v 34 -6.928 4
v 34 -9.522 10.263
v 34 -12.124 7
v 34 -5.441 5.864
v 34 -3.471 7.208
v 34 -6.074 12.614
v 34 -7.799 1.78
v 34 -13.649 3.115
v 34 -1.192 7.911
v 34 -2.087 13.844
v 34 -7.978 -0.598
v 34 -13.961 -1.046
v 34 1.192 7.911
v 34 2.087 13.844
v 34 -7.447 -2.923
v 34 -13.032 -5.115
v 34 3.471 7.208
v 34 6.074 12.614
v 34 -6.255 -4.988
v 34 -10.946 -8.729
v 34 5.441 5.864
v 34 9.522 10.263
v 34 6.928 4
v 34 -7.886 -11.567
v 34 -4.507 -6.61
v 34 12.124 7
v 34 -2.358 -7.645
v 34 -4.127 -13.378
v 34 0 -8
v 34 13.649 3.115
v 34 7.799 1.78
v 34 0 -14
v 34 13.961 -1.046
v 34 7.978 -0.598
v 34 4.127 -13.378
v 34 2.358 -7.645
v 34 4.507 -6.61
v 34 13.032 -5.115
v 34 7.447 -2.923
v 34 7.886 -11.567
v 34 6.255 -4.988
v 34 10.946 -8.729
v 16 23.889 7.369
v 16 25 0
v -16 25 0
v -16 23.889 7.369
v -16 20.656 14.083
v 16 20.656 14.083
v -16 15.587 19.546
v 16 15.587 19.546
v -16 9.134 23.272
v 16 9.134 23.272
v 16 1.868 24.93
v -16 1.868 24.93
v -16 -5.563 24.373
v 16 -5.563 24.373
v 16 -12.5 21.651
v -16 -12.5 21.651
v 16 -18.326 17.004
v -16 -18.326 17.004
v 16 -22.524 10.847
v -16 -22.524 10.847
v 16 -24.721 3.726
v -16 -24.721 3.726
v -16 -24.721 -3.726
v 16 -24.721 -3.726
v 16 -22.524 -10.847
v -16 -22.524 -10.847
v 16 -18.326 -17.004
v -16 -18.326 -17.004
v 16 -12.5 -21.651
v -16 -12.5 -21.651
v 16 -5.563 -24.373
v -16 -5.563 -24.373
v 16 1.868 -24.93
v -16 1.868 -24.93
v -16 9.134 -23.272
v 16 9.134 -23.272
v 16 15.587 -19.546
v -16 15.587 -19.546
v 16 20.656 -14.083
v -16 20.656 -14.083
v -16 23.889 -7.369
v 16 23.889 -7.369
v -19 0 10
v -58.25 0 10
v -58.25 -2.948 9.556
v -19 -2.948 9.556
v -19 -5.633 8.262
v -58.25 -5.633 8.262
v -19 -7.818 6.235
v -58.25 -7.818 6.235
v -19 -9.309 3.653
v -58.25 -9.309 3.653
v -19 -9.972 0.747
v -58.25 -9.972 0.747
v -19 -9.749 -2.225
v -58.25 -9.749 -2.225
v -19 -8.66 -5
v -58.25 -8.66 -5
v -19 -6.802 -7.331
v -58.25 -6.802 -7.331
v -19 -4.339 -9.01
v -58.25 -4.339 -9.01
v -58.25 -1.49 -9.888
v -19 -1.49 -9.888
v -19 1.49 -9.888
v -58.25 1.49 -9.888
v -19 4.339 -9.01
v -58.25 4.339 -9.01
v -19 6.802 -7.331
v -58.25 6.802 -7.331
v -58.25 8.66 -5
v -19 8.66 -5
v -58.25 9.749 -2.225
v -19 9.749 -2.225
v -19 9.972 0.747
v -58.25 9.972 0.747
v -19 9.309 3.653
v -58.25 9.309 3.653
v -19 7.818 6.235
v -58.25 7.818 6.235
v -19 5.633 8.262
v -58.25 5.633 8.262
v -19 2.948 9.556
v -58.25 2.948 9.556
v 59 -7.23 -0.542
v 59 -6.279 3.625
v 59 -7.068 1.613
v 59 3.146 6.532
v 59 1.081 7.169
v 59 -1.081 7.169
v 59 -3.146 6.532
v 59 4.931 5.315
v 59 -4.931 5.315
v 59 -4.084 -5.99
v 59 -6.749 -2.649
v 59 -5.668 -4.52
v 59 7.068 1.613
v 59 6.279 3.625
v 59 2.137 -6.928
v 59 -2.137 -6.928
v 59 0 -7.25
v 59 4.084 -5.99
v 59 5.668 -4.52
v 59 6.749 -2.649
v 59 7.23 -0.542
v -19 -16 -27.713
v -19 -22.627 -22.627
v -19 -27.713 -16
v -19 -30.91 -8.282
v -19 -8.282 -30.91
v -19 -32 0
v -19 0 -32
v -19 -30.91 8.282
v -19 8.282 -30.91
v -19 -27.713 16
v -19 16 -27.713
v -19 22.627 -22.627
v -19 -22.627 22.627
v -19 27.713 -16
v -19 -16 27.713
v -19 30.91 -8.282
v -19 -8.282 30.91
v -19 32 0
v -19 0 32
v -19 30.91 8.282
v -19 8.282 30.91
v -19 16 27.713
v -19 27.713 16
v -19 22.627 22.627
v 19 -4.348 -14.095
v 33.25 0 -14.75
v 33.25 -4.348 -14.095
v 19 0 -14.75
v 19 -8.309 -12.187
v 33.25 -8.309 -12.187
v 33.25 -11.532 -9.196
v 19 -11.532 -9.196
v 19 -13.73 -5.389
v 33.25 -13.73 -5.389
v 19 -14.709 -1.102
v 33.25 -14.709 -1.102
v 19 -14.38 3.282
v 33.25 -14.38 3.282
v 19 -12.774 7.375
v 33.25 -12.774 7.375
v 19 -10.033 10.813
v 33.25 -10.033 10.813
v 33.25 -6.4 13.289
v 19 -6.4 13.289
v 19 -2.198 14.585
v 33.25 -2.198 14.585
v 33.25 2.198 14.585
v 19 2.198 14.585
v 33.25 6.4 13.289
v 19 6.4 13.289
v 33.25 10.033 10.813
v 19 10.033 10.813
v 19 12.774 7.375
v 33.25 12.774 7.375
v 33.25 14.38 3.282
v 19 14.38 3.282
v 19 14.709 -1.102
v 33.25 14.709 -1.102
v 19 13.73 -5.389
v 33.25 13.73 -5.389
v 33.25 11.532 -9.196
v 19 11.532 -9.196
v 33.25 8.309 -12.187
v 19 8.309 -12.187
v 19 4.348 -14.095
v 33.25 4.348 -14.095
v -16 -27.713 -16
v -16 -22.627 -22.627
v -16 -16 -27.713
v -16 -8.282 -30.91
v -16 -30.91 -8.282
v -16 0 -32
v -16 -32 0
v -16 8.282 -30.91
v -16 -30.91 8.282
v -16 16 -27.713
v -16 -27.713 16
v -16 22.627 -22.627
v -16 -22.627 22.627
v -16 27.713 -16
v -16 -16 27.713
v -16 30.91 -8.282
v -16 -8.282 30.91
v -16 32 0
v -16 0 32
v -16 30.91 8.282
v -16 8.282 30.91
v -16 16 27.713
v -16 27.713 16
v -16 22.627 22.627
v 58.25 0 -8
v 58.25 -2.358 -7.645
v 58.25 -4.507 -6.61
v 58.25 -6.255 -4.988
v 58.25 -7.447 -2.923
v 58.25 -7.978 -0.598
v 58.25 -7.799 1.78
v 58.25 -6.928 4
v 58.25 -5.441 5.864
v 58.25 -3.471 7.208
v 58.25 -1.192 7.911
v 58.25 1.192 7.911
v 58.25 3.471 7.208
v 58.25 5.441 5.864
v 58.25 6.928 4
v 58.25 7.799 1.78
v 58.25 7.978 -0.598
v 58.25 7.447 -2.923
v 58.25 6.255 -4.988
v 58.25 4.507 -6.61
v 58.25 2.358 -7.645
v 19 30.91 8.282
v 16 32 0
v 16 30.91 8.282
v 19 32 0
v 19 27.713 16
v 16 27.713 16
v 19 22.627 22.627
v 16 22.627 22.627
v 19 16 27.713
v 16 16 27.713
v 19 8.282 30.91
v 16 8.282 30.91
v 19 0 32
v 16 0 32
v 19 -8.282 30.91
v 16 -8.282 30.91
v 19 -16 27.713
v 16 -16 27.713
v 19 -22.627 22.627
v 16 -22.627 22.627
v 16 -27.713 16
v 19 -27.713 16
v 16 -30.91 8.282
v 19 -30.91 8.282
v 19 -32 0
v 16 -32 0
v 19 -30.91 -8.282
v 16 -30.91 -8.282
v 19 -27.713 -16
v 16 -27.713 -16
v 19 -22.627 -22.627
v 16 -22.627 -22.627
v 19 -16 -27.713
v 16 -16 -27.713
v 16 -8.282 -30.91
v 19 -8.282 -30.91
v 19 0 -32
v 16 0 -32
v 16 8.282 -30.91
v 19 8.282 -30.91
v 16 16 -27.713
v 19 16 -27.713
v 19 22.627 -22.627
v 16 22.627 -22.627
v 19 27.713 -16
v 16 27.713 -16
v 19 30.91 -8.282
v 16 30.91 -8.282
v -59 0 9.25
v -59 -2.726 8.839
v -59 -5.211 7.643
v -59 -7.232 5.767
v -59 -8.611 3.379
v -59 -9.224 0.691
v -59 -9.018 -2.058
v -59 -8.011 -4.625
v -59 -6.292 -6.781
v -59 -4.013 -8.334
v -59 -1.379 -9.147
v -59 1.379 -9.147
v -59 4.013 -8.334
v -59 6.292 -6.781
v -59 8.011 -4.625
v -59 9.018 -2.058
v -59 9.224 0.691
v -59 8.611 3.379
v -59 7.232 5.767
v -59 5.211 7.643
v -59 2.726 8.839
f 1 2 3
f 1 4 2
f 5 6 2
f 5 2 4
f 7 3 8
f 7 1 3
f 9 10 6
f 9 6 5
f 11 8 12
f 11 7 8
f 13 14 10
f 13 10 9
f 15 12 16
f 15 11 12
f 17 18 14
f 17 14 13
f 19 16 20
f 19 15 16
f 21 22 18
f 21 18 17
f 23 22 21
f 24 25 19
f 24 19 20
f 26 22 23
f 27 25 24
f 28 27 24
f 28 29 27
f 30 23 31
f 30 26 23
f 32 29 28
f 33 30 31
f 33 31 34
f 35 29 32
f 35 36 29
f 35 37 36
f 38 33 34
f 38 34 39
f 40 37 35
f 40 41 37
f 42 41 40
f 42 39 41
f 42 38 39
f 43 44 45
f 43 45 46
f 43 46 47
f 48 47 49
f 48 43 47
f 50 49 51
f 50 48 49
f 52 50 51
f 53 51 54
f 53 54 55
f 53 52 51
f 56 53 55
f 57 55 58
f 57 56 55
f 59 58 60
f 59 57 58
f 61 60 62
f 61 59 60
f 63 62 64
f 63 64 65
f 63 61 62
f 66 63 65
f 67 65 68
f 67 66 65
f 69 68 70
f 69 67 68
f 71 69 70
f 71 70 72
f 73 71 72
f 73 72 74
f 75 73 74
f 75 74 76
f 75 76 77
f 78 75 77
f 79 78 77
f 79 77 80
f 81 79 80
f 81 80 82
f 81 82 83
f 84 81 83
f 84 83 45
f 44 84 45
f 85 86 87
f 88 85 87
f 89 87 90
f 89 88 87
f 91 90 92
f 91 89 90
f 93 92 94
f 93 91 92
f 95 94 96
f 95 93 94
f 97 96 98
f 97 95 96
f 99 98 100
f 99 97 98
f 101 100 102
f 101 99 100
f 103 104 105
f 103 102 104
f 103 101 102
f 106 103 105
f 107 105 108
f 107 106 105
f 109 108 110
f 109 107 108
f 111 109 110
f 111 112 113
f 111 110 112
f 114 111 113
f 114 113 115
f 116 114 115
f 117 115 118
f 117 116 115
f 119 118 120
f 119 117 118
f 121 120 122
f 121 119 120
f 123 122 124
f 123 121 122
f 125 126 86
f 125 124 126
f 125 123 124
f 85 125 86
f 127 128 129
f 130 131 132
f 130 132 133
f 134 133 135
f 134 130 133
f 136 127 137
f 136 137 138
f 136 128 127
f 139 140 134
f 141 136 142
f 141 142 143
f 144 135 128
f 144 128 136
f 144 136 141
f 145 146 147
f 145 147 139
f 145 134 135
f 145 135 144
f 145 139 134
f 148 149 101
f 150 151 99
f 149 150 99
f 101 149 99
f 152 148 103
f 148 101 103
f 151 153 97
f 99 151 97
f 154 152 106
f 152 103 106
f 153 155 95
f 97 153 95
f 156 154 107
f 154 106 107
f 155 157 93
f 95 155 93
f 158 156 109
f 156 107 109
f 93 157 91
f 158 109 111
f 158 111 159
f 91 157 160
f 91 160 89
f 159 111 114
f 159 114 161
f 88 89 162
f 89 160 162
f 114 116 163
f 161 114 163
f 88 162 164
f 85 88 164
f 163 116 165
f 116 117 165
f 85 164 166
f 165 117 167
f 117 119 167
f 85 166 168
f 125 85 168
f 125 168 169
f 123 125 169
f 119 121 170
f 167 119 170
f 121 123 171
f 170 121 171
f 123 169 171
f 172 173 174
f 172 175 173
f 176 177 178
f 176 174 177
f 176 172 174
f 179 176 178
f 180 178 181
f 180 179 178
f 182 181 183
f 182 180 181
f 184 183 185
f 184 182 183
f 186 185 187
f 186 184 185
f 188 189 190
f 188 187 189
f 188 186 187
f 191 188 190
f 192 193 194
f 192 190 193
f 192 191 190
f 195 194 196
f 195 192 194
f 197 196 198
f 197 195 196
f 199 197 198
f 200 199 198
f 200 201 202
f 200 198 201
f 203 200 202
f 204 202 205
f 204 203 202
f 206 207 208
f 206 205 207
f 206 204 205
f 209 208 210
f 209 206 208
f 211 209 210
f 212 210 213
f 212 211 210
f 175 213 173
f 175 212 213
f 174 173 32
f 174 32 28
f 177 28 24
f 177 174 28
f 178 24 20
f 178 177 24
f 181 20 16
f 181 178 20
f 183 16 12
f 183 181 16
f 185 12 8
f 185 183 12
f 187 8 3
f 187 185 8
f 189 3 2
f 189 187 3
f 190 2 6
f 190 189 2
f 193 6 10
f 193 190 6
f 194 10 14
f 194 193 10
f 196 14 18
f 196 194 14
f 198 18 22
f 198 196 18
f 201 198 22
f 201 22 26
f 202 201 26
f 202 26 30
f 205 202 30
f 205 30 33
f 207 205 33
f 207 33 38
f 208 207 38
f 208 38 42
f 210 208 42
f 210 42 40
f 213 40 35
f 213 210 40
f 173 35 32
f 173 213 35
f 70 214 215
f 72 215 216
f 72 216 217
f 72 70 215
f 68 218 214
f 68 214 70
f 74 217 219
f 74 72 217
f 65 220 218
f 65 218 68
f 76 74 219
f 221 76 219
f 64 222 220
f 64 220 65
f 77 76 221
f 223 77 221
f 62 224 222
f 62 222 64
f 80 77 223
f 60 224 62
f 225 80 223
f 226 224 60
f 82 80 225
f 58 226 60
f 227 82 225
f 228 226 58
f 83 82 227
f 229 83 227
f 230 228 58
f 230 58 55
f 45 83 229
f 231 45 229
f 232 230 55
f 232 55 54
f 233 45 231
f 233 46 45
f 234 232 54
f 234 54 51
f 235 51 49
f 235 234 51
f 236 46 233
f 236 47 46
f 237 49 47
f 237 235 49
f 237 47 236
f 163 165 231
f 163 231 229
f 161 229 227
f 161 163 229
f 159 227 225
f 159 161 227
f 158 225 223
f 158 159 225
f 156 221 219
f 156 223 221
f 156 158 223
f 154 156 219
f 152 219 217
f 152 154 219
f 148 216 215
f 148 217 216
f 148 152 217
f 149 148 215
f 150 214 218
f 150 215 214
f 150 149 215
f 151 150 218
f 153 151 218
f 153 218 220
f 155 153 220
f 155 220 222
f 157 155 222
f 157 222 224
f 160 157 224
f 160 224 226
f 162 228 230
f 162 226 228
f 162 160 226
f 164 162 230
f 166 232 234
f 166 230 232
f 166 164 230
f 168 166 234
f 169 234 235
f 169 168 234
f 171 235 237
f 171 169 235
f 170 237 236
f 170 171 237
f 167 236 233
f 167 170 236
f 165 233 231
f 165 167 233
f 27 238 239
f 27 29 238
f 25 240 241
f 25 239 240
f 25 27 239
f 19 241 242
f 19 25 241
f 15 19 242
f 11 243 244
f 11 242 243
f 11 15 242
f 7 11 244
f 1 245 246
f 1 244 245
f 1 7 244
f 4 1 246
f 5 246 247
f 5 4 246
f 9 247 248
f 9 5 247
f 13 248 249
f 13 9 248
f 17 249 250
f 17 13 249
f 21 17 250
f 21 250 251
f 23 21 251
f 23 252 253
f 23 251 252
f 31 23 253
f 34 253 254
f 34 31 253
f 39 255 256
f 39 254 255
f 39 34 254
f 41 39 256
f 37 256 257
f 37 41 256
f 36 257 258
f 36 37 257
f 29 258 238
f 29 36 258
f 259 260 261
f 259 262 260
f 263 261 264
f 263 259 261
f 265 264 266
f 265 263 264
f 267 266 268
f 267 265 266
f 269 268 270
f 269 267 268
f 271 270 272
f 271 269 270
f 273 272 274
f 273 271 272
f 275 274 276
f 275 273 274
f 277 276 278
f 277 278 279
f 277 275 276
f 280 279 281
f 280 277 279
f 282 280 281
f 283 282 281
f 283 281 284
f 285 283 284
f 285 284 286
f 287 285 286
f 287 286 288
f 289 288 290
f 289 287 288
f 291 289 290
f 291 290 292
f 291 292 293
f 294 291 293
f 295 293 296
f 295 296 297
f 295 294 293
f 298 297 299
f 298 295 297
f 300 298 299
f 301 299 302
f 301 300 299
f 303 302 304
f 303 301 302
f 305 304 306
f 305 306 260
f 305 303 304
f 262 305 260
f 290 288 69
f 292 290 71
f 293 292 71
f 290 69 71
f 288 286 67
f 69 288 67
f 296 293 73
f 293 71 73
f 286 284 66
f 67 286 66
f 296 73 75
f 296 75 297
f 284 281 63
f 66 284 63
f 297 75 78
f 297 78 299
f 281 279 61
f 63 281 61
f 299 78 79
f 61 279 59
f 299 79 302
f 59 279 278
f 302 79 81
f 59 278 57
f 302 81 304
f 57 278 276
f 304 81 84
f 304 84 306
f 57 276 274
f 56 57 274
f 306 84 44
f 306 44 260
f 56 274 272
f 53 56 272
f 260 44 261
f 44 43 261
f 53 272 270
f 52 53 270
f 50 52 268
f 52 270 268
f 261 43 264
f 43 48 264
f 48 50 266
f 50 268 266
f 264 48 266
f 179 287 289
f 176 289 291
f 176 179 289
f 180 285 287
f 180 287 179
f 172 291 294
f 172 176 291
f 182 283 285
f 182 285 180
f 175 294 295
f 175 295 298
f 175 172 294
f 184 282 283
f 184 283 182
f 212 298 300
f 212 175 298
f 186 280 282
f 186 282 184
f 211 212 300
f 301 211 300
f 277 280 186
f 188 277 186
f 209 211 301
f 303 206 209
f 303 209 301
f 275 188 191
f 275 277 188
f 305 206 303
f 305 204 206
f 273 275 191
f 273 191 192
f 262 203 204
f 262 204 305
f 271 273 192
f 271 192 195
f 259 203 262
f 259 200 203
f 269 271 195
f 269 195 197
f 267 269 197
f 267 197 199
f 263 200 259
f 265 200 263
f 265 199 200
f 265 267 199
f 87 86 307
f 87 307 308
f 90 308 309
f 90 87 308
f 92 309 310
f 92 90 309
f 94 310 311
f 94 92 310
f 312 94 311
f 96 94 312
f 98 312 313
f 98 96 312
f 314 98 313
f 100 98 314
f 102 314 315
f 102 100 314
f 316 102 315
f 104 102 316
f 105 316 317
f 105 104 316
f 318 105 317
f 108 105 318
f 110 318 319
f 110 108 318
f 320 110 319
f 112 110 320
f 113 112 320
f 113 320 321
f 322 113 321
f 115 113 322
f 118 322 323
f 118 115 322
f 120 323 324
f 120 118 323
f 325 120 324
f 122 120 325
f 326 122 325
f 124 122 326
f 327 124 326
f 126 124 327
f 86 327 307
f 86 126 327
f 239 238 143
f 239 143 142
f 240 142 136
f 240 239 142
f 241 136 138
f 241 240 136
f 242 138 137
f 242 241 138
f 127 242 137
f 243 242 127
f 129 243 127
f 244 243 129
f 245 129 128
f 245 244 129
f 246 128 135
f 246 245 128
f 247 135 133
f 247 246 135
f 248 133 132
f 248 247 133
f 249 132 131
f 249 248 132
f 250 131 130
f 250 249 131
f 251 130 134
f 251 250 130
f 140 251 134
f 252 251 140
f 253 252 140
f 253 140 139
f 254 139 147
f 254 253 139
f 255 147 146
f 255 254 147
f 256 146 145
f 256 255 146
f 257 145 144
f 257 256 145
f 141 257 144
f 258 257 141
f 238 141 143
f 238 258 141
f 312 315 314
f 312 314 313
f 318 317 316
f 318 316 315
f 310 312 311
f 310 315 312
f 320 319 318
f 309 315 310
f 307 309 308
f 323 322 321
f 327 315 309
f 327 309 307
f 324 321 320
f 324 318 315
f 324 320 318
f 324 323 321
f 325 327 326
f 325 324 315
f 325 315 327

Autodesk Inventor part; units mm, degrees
ref_plane "YZ Plane" through (0, 0, 0) normal (1, 0, 0) x (0, 1, 0)
ref_plane "XZ Plane" through (0, 0, 0) normal (0, 1, 0) x (-1, 0, 0)
ref_plane "XY Plane" through (0, 0, 0) normal (0, 0, 1) x (1, 0, 0)
sketch "Schizzo1" plane through (0, 0, 0) normal (0, 0, 1) x (1, 0, 0)
  line L0 (-16, 25) -> (16, 25)
  line L1 (-16, 25) -> (-16, 32)
  line L2 (-16, 32) -> (-19, 32)
  line L3 (-19, 32) -> (-19, 0)
  line L4 (16, 25) -> (16, 32)
  line L5 (16, 32) -> (19, 32)
  line L6 (19, 32) -> (19, 0)
  line L7 (-19, 0) -> (19, 0)
  point P0 (0, 0)
  point P1 (0, 0)
  dimension "d2" = 7
  dimension "d3" = 3
  dimension "d4" = 3
  dimension "d5" = 7
  dimension "d6" = 50
  dimension "d7" = 32
  dimension "d8" = 38
revolve "Rivoluzione1" add sketch "Schizzo1" angle 360 about axis through (-19, 0, 0) along (1, 0, 0)
sketch "Schizzo3" plane through (-19, 0, 0) normal (-1, 0, 0) x (0, 0, 1)
  point P0 (0, 0)
sketch "Schizzo4" plane through (19, 0, 0) normal (1, 0, 0) x (0, 0, -1)
  circle A0 centre (0, 0) radius 14.75
  dimension "d13" = 29.5
extrude "Estrusione2" add sketch "Schizzo4" along normal blind 15
sketch "Schizzo5" plane through (34, 0, 0) normal (1, 0, 0) x (0, 0, -1)
  circle A0 centre (0, 0) radius 8
  dimension "d16" = 16
extrude "Estrusione3" add sketch "Schizzo5" along normal blind 25
thread "Filettatura1" size "M16x2" class "6g" standard "ANSI Metric M Profile" length 10
sketch "Schizzo6" plane through (-19, 0, 0) normal (-1, 0, 0) x (0, 0, 1)
  circle A0 centre (0, 0) radius 10
  dimension "d24" = 20
extrude "Estrusione4" add sketch "Schizzo6" along normal blind 40
chamfer "Smusso1" distance 0.75 angle 45 3 edges at (34, 0, 14.75) (59, 0, 8) (-59, 0, -10)
properties part number "Puleggia minore" material "Alluminio 6061"
